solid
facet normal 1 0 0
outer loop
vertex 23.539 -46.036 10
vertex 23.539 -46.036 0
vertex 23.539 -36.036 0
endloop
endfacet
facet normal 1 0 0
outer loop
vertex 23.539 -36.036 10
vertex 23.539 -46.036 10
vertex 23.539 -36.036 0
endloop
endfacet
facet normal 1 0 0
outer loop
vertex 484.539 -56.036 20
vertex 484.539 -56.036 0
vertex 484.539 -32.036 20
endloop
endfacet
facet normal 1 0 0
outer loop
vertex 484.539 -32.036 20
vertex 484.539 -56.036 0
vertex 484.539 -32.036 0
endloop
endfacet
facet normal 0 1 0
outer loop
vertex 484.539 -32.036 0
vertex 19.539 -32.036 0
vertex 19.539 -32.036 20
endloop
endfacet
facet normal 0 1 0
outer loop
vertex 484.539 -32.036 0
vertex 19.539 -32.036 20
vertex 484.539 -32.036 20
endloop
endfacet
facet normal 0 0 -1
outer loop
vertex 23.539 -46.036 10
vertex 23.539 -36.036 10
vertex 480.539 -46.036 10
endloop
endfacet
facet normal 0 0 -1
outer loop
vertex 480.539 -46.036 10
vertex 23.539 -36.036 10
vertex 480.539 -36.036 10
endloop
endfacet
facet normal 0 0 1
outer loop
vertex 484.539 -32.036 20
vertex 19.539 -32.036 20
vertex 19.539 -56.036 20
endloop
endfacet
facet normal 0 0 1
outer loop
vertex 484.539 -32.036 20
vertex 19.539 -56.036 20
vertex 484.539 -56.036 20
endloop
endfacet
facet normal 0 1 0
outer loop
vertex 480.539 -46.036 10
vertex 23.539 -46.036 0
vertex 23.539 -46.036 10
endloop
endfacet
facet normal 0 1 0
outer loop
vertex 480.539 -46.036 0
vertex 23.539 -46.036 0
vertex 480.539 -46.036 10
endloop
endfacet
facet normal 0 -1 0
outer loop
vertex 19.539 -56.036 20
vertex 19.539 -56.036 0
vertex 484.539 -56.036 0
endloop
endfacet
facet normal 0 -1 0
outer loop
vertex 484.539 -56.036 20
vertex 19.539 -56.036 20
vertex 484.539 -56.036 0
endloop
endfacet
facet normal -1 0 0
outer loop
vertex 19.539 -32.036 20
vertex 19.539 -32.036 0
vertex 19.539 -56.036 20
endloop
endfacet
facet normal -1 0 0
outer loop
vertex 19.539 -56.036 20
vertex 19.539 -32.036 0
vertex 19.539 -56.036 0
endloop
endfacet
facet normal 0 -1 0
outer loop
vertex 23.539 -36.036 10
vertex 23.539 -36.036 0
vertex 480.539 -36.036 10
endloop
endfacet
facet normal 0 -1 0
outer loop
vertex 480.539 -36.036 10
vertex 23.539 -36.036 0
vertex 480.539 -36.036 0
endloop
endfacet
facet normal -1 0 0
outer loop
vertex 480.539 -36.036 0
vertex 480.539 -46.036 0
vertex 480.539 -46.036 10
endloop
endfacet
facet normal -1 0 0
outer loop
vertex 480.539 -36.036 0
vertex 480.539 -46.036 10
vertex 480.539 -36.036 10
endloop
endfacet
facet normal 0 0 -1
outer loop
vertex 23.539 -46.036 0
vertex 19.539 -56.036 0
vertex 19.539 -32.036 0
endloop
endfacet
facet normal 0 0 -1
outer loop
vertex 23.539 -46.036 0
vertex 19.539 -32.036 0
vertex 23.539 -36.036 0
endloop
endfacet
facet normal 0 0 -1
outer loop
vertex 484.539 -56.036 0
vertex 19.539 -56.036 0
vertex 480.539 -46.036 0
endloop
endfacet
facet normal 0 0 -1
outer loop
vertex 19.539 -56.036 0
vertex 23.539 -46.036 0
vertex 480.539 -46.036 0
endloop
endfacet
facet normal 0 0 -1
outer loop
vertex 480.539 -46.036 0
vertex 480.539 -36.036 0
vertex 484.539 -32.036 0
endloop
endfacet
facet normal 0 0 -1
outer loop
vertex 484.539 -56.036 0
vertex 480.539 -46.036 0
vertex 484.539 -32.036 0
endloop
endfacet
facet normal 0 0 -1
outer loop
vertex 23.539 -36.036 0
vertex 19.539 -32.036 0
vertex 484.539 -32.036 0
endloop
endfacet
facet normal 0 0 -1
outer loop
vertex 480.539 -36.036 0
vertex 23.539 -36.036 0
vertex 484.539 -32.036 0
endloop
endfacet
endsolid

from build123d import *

# Parameters (mm, degrees)
F0_W     = 465
F0_H     = 18
F0_W_2   = 457
F0_H_2   = 10
F0_H_3   = 6
F1_DEPTH = 20
F2_START = 10
F2_DEPTH = 10


with BuildPart() as f1:
    # F0 (on Top) → F1 (new body)
    with BuildSketch(Plane.XY):
        with Locations((252.0387396961, -41.0362935066)):
            Rectangle(F0_W, F0_H)
        with Locations((252.0387396961, -41.0362935066)):
            Rectangle(F0_W_2, F0_H_2, mode=Mode.SUBTRACT)
        with Locations((252.0387396961, -53.0362935066)):
            Rectangle(F0_W, F0_H_3)
    extrude(amount=F1_DEPTH)

    # F0 (on Top) → F2 (join)
    with BuildSketch(Plane.XY.offset(F2_START)):
        with Locations((252.0387396961, -41.0362935066)):
            Rectangle(F0_W_2, F0_H_2)
    extrude(amount=F2_DEPTH)


solid = f1.part
